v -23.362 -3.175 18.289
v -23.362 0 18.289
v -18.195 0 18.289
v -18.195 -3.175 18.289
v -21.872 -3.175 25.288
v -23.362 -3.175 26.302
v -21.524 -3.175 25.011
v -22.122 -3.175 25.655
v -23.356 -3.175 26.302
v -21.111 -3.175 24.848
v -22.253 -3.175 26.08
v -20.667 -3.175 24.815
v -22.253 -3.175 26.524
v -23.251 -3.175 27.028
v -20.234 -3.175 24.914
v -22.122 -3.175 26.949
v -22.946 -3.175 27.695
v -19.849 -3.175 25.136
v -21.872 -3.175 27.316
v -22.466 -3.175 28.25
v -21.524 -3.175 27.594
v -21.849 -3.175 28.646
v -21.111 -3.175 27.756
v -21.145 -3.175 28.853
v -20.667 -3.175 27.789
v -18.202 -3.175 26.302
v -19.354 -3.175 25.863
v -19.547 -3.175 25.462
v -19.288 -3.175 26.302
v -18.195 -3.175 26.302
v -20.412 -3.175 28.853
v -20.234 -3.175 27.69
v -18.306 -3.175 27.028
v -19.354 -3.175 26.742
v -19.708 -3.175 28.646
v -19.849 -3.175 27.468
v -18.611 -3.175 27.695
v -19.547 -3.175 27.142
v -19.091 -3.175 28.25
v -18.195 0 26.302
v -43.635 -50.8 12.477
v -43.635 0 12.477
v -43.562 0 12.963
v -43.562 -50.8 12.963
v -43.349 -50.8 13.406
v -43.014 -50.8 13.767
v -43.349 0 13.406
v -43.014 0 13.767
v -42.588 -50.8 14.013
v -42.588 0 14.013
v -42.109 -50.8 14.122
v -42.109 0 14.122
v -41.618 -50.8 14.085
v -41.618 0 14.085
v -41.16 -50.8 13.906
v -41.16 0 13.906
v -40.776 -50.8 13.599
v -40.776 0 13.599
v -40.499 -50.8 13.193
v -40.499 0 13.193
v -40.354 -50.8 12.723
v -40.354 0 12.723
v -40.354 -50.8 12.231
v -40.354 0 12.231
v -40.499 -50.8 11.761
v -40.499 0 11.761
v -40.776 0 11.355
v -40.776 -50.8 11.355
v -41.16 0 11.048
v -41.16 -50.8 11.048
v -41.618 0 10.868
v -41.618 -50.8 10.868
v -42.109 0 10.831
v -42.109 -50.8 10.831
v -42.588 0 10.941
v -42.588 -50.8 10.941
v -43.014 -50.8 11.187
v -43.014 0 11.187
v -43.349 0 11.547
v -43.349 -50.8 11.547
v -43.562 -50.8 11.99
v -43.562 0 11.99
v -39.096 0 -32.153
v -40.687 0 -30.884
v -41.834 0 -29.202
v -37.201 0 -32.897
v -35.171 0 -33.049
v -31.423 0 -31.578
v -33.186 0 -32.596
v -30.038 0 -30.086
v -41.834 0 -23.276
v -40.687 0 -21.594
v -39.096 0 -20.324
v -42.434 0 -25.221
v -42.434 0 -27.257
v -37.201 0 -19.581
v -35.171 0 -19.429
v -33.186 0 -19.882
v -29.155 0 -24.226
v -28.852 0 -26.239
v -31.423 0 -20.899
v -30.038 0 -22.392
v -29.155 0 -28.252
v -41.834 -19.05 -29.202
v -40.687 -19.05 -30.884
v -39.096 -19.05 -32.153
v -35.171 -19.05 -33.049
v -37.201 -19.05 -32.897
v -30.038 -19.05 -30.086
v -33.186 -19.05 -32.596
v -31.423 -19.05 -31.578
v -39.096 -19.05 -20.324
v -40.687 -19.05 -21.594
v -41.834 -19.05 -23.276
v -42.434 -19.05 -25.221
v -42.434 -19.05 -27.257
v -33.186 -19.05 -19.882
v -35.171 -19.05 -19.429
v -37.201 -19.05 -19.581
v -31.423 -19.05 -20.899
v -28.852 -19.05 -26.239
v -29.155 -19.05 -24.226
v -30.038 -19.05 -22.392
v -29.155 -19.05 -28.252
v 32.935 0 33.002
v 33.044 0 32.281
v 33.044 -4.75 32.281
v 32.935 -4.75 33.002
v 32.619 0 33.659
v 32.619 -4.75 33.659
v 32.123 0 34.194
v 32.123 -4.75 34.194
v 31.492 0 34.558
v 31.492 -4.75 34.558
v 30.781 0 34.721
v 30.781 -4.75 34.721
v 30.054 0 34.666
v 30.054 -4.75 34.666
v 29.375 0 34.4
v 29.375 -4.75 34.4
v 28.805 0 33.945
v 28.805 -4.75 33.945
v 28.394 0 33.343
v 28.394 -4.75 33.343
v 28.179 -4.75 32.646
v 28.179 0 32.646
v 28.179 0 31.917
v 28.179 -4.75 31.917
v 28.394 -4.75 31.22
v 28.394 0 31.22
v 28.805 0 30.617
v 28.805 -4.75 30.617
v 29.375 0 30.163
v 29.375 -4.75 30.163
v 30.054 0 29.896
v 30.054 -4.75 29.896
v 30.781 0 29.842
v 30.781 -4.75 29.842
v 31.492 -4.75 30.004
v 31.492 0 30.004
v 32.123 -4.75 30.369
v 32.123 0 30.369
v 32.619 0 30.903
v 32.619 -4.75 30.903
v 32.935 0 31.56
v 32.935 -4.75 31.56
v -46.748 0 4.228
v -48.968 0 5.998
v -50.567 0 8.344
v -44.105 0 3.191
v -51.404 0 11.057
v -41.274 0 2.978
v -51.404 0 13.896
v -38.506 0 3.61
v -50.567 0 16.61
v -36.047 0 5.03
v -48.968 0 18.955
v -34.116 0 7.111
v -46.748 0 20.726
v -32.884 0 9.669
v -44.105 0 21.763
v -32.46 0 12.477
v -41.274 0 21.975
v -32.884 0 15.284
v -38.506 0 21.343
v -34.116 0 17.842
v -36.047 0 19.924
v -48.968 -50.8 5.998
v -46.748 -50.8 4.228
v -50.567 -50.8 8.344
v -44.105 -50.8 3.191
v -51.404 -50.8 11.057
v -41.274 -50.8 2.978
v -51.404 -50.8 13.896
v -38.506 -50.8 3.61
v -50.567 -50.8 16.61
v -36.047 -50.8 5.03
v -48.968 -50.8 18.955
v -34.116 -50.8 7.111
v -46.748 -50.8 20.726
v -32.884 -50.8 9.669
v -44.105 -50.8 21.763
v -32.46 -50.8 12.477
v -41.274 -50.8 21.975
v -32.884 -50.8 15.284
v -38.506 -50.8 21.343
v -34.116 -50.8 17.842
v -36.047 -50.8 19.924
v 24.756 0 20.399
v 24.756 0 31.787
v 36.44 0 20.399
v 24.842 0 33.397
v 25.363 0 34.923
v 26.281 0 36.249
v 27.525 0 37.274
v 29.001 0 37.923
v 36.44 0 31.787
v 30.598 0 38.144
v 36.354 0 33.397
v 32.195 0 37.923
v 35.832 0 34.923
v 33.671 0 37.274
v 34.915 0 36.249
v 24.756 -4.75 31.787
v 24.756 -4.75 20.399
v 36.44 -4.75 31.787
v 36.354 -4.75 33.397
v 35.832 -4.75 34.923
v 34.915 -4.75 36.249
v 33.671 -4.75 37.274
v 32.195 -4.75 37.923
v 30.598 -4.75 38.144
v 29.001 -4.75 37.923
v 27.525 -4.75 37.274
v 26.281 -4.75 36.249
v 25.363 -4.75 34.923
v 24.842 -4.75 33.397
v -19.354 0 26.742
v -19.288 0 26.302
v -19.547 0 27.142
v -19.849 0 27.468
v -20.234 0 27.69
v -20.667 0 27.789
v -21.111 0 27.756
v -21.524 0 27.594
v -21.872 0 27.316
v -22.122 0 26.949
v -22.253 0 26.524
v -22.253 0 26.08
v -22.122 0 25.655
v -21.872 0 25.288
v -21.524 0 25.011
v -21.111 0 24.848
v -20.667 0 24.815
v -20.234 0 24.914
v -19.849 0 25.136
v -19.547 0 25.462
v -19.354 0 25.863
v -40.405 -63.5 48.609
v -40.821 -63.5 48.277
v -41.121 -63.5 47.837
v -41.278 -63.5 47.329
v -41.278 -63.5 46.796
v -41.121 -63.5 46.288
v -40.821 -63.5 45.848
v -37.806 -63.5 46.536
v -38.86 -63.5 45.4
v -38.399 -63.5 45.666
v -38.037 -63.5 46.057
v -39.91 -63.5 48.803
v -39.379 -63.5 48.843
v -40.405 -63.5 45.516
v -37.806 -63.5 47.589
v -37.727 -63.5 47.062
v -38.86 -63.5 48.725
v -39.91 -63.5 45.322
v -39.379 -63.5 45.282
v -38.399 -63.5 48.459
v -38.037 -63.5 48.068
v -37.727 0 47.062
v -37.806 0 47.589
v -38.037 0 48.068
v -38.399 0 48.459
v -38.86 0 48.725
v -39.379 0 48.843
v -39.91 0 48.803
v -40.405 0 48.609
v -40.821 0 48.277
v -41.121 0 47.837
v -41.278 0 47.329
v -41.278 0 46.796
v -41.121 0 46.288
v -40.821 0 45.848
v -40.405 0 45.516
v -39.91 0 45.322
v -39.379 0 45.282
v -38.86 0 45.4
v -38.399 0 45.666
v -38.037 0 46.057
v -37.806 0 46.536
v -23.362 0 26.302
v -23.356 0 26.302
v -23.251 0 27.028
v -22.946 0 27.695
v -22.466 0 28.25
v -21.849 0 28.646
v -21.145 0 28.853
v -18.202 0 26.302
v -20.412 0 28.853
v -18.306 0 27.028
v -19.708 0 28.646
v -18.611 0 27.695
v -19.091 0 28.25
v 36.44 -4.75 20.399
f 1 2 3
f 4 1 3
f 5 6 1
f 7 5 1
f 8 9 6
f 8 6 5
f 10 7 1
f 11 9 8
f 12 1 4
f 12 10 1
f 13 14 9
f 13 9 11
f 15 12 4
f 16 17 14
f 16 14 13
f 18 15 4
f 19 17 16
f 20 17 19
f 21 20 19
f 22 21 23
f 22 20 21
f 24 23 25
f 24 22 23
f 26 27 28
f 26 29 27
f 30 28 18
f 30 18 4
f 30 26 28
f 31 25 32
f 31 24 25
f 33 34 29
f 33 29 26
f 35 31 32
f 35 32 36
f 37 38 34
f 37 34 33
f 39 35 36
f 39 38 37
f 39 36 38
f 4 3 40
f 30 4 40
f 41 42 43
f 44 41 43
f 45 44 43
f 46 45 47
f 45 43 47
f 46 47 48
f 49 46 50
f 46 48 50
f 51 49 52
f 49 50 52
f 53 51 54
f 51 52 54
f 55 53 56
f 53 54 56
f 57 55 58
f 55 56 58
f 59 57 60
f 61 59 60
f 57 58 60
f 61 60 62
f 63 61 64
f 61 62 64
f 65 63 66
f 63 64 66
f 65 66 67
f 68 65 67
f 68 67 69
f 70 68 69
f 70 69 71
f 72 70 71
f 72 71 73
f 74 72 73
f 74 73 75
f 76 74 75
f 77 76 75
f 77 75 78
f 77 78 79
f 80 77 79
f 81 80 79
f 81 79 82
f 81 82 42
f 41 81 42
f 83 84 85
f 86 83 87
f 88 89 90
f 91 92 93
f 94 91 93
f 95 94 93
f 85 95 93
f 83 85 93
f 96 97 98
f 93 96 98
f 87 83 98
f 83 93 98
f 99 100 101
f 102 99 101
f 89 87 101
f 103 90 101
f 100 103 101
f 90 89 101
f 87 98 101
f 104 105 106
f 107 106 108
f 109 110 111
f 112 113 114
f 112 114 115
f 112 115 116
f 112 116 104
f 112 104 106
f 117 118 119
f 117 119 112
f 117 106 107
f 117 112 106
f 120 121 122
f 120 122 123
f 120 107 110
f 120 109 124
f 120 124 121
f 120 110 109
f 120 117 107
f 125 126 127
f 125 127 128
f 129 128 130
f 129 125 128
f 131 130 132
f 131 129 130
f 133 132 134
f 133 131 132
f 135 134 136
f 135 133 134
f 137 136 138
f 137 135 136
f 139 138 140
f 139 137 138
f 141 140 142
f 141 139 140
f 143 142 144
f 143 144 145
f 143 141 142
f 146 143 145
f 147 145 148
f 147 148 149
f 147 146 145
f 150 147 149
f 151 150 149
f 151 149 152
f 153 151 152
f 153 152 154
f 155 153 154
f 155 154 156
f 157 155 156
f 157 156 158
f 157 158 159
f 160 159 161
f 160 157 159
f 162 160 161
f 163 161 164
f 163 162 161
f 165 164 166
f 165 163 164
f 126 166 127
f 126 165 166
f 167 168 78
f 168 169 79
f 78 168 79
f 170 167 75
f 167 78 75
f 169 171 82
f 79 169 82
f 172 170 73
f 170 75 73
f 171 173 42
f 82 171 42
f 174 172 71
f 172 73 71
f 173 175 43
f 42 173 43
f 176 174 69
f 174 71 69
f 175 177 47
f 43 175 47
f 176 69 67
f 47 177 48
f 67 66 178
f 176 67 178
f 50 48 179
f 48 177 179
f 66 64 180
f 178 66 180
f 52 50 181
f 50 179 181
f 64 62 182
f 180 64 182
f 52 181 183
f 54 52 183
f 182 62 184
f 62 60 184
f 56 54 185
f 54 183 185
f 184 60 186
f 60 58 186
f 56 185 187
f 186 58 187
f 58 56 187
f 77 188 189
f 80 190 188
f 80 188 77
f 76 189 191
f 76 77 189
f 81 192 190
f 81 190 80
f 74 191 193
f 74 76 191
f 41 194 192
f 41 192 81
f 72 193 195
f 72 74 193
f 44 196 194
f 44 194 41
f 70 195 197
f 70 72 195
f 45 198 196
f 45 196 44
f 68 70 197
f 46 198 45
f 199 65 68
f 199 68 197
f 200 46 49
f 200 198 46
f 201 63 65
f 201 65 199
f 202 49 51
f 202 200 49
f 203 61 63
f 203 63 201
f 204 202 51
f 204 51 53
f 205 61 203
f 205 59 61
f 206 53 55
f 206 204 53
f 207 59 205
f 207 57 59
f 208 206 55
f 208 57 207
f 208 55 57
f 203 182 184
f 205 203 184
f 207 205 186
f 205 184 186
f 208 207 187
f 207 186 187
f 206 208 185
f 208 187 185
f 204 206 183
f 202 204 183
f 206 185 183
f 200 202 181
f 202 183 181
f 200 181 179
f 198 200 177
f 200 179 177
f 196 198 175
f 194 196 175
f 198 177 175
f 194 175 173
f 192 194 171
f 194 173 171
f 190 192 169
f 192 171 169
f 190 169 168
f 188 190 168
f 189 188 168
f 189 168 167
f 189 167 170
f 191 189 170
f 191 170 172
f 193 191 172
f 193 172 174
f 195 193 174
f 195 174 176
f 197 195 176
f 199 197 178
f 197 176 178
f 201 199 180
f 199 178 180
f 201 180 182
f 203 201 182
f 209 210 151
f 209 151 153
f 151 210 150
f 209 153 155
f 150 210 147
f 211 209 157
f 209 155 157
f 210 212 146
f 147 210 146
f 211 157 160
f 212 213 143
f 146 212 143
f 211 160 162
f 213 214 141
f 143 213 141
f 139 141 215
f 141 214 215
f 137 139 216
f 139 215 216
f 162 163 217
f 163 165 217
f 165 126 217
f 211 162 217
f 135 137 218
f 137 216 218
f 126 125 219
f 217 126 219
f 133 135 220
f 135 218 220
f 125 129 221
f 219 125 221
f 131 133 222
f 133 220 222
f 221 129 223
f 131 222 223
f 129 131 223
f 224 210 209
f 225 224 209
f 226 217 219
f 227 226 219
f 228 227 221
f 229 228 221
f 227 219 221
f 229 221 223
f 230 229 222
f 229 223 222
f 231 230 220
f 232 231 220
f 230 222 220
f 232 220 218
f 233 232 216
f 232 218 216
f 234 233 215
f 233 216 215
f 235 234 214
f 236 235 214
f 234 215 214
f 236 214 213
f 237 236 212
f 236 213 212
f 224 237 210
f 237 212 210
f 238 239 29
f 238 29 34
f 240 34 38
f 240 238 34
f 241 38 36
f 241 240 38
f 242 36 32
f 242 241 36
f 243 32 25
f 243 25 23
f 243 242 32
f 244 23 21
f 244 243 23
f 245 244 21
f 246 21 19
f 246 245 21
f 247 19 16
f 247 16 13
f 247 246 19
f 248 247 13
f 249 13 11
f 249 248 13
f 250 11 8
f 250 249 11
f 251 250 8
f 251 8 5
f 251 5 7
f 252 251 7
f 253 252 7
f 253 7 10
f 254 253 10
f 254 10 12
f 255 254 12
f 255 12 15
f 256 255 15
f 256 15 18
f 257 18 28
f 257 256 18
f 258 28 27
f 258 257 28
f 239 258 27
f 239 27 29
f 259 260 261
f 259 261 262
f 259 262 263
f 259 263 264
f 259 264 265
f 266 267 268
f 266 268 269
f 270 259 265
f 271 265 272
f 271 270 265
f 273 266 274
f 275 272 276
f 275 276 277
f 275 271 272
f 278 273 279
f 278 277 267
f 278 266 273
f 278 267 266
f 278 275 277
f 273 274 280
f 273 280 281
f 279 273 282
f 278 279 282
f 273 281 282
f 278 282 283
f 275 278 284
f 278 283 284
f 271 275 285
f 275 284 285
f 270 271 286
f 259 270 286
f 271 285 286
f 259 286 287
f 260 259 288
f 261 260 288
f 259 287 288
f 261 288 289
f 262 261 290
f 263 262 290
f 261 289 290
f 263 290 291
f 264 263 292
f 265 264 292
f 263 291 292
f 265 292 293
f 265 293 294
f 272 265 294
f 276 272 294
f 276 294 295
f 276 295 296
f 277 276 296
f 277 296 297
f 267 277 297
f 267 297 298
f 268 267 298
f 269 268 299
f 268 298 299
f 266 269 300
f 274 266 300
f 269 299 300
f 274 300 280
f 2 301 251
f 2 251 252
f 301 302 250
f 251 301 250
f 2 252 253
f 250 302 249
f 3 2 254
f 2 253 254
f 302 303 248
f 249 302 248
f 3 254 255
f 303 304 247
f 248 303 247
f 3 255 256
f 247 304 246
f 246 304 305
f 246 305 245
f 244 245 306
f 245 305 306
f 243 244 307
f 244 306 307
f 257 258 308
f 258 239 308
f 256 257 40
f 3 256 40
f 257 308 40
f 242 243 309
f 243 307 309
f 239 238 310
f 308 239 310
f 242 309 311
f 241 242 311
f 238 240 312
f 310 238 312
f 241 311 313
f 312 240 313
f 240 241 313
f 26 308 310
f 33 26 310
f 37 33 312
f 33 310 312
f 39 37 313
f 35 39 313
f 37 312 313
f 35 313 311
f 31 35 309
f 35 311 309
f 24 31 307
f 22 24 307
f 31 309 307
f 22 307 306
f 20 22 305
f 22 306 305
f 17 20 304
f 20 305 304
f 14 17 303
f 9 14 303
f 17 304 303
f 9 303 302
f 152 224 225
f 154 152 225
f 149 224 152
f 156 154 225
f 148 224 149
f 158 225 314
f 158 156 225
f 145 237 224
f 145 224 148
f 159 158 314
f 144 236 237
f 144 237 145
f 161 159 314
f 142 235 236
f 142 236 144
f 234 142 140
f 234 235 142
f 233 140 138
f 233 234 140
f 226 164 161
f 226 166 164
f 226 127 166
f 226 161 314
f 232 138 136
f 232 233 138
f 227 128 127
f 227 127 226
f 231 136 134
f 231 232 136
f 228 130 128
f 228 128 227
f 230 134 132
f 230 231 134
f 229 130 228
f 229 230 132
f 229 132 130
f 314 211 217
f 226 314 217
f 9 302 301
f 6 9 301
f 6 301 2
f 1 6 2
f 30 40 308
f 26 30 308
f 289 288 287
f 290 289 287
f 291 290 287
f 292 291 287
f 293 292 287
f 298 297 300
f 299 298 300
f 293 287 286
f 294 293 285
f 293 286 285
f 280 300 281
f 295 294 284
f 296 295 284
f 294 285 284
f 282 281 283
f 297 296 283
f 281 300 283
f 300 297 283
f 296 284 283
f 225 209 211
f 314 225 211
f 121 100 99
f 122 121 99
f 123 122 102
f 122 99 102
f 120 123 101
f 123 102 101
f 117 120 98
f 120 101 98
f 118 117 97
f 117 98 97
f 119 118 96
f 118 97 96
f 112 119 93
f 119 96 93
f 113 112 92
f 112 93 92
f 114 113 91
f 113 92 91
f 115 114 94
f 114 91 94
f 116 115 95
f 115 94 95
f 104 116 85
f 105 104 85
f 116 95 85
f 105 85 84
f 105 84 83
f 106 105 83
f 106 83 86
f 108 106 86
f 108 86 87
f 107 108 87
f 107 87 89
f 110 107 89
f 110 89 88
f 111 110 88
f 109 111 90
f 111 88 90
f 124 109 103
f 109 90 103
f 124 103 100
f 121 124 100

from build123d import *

# Parameters (mm, degrees)
F0_R      = 9.525
F1_DEPTH  = 50.8
F3_D      = 3.3
F4_R      = 1.78562
F5_DEPTH  = 63.5
F6_R      = 6.8293171729
F7_DEPTH  = 19.05
F8_R      = 2.4462597951
F9_DEPTH  = 4.7498
F10_R     = 1.4911245413
F11_DEPTH = 3.175


with BuildPart() as f1:
    # F0 (on Front) → F1 (new body)
    with BuildSketch(Plane.XZ):
        with Locations((-41.9854447246, 12.4768065289)):
            Circle(F0_R)
    extrude(amount=F1_DEPTH)

    # F3 (through all)
    with Locations(Plane.XZ.offset(50.8)):
        with Locations((-41.9854447246, 12.4768065289)):
            Hole(F3_D / 2)


with BuildPart() as f5:
    # F4 (on Front) → F5 (new body)
    with BuildSketch(Plane.XZ):
        with Locations((-39.5124815404, 47.0624677837)):
            Circle(F4_R)
    extrude(amount=F5_DEPTH)


with BuildPart() as f7:
    # F6 (on Front) → F7 (new body)
    with BuildSketch(Plane.XZ):
        with Locations((-35.6809161603, -26.2388456613)):
            Circle(F6_R)
    extrude(amount=F7_DEPTH)


with BuildPart() as f9:
    # F8 (on Front) → F9 (new body)
    with BuildSketch(Plane.XZ):
        with BuildLine():
            Line((24.7555691749, 31.7871444005), (24.7555691749, 20.3985888511))
            Line((24.7555691749, 20.3985888511), (36.4402011037, 20.3985888511))
            Line((36.4402011037, 20.3985888511), (36.4402011037, 31.7871444005))
            ThreePointArc((36.4402011037, 31.7871444005), (30.5978851393, 38.1444387742), (24.7555691749, 31.7871444005))
        make_face()
        with Locations((30.5978851393, 32.2812646627)):
            Circle(F8_R, mode=Mode.SUBTRACT)
    extrude(amount=F9_DEPTH)


with BuildPart() as f11:
    # F10 (on Front) → F11 (new body)
    with BuildSketch(Plane.XZ):
        with BuildLine():
            Line((-23.3555076022, 26.3022053987), (-23.3622975647, 26.3022053987))
            Line((-23.3622975647, 26.3022053987), (-23.3622975647, 18.2888861746))
            Line((-23.3622975647, 18.2888861746), (-18.1952770799, 18.2888861746))
            Line((-18.1952770799, 18.2888861746), (-18.1952770799, 26.3022053987))
            Line((-18.1952770799, 26.3022053987), (-18.2020670424, 26.3022053987))
            ThreePointArc((-18.2020670424, 26.3022053987), (-20.7787873223, 28.8789256786), (-23.3555076022, 26.3022053987))
        make_face()
        with Locations((-20.7787873223, 26.3022053987)):
            Circle(F10_R, mode=Mode.SUBTRACT)
    extrude(amount=F11_DEPTH)


solid = Compound([f1.part, f5.part, f7.part, f9.part, f11.part])
